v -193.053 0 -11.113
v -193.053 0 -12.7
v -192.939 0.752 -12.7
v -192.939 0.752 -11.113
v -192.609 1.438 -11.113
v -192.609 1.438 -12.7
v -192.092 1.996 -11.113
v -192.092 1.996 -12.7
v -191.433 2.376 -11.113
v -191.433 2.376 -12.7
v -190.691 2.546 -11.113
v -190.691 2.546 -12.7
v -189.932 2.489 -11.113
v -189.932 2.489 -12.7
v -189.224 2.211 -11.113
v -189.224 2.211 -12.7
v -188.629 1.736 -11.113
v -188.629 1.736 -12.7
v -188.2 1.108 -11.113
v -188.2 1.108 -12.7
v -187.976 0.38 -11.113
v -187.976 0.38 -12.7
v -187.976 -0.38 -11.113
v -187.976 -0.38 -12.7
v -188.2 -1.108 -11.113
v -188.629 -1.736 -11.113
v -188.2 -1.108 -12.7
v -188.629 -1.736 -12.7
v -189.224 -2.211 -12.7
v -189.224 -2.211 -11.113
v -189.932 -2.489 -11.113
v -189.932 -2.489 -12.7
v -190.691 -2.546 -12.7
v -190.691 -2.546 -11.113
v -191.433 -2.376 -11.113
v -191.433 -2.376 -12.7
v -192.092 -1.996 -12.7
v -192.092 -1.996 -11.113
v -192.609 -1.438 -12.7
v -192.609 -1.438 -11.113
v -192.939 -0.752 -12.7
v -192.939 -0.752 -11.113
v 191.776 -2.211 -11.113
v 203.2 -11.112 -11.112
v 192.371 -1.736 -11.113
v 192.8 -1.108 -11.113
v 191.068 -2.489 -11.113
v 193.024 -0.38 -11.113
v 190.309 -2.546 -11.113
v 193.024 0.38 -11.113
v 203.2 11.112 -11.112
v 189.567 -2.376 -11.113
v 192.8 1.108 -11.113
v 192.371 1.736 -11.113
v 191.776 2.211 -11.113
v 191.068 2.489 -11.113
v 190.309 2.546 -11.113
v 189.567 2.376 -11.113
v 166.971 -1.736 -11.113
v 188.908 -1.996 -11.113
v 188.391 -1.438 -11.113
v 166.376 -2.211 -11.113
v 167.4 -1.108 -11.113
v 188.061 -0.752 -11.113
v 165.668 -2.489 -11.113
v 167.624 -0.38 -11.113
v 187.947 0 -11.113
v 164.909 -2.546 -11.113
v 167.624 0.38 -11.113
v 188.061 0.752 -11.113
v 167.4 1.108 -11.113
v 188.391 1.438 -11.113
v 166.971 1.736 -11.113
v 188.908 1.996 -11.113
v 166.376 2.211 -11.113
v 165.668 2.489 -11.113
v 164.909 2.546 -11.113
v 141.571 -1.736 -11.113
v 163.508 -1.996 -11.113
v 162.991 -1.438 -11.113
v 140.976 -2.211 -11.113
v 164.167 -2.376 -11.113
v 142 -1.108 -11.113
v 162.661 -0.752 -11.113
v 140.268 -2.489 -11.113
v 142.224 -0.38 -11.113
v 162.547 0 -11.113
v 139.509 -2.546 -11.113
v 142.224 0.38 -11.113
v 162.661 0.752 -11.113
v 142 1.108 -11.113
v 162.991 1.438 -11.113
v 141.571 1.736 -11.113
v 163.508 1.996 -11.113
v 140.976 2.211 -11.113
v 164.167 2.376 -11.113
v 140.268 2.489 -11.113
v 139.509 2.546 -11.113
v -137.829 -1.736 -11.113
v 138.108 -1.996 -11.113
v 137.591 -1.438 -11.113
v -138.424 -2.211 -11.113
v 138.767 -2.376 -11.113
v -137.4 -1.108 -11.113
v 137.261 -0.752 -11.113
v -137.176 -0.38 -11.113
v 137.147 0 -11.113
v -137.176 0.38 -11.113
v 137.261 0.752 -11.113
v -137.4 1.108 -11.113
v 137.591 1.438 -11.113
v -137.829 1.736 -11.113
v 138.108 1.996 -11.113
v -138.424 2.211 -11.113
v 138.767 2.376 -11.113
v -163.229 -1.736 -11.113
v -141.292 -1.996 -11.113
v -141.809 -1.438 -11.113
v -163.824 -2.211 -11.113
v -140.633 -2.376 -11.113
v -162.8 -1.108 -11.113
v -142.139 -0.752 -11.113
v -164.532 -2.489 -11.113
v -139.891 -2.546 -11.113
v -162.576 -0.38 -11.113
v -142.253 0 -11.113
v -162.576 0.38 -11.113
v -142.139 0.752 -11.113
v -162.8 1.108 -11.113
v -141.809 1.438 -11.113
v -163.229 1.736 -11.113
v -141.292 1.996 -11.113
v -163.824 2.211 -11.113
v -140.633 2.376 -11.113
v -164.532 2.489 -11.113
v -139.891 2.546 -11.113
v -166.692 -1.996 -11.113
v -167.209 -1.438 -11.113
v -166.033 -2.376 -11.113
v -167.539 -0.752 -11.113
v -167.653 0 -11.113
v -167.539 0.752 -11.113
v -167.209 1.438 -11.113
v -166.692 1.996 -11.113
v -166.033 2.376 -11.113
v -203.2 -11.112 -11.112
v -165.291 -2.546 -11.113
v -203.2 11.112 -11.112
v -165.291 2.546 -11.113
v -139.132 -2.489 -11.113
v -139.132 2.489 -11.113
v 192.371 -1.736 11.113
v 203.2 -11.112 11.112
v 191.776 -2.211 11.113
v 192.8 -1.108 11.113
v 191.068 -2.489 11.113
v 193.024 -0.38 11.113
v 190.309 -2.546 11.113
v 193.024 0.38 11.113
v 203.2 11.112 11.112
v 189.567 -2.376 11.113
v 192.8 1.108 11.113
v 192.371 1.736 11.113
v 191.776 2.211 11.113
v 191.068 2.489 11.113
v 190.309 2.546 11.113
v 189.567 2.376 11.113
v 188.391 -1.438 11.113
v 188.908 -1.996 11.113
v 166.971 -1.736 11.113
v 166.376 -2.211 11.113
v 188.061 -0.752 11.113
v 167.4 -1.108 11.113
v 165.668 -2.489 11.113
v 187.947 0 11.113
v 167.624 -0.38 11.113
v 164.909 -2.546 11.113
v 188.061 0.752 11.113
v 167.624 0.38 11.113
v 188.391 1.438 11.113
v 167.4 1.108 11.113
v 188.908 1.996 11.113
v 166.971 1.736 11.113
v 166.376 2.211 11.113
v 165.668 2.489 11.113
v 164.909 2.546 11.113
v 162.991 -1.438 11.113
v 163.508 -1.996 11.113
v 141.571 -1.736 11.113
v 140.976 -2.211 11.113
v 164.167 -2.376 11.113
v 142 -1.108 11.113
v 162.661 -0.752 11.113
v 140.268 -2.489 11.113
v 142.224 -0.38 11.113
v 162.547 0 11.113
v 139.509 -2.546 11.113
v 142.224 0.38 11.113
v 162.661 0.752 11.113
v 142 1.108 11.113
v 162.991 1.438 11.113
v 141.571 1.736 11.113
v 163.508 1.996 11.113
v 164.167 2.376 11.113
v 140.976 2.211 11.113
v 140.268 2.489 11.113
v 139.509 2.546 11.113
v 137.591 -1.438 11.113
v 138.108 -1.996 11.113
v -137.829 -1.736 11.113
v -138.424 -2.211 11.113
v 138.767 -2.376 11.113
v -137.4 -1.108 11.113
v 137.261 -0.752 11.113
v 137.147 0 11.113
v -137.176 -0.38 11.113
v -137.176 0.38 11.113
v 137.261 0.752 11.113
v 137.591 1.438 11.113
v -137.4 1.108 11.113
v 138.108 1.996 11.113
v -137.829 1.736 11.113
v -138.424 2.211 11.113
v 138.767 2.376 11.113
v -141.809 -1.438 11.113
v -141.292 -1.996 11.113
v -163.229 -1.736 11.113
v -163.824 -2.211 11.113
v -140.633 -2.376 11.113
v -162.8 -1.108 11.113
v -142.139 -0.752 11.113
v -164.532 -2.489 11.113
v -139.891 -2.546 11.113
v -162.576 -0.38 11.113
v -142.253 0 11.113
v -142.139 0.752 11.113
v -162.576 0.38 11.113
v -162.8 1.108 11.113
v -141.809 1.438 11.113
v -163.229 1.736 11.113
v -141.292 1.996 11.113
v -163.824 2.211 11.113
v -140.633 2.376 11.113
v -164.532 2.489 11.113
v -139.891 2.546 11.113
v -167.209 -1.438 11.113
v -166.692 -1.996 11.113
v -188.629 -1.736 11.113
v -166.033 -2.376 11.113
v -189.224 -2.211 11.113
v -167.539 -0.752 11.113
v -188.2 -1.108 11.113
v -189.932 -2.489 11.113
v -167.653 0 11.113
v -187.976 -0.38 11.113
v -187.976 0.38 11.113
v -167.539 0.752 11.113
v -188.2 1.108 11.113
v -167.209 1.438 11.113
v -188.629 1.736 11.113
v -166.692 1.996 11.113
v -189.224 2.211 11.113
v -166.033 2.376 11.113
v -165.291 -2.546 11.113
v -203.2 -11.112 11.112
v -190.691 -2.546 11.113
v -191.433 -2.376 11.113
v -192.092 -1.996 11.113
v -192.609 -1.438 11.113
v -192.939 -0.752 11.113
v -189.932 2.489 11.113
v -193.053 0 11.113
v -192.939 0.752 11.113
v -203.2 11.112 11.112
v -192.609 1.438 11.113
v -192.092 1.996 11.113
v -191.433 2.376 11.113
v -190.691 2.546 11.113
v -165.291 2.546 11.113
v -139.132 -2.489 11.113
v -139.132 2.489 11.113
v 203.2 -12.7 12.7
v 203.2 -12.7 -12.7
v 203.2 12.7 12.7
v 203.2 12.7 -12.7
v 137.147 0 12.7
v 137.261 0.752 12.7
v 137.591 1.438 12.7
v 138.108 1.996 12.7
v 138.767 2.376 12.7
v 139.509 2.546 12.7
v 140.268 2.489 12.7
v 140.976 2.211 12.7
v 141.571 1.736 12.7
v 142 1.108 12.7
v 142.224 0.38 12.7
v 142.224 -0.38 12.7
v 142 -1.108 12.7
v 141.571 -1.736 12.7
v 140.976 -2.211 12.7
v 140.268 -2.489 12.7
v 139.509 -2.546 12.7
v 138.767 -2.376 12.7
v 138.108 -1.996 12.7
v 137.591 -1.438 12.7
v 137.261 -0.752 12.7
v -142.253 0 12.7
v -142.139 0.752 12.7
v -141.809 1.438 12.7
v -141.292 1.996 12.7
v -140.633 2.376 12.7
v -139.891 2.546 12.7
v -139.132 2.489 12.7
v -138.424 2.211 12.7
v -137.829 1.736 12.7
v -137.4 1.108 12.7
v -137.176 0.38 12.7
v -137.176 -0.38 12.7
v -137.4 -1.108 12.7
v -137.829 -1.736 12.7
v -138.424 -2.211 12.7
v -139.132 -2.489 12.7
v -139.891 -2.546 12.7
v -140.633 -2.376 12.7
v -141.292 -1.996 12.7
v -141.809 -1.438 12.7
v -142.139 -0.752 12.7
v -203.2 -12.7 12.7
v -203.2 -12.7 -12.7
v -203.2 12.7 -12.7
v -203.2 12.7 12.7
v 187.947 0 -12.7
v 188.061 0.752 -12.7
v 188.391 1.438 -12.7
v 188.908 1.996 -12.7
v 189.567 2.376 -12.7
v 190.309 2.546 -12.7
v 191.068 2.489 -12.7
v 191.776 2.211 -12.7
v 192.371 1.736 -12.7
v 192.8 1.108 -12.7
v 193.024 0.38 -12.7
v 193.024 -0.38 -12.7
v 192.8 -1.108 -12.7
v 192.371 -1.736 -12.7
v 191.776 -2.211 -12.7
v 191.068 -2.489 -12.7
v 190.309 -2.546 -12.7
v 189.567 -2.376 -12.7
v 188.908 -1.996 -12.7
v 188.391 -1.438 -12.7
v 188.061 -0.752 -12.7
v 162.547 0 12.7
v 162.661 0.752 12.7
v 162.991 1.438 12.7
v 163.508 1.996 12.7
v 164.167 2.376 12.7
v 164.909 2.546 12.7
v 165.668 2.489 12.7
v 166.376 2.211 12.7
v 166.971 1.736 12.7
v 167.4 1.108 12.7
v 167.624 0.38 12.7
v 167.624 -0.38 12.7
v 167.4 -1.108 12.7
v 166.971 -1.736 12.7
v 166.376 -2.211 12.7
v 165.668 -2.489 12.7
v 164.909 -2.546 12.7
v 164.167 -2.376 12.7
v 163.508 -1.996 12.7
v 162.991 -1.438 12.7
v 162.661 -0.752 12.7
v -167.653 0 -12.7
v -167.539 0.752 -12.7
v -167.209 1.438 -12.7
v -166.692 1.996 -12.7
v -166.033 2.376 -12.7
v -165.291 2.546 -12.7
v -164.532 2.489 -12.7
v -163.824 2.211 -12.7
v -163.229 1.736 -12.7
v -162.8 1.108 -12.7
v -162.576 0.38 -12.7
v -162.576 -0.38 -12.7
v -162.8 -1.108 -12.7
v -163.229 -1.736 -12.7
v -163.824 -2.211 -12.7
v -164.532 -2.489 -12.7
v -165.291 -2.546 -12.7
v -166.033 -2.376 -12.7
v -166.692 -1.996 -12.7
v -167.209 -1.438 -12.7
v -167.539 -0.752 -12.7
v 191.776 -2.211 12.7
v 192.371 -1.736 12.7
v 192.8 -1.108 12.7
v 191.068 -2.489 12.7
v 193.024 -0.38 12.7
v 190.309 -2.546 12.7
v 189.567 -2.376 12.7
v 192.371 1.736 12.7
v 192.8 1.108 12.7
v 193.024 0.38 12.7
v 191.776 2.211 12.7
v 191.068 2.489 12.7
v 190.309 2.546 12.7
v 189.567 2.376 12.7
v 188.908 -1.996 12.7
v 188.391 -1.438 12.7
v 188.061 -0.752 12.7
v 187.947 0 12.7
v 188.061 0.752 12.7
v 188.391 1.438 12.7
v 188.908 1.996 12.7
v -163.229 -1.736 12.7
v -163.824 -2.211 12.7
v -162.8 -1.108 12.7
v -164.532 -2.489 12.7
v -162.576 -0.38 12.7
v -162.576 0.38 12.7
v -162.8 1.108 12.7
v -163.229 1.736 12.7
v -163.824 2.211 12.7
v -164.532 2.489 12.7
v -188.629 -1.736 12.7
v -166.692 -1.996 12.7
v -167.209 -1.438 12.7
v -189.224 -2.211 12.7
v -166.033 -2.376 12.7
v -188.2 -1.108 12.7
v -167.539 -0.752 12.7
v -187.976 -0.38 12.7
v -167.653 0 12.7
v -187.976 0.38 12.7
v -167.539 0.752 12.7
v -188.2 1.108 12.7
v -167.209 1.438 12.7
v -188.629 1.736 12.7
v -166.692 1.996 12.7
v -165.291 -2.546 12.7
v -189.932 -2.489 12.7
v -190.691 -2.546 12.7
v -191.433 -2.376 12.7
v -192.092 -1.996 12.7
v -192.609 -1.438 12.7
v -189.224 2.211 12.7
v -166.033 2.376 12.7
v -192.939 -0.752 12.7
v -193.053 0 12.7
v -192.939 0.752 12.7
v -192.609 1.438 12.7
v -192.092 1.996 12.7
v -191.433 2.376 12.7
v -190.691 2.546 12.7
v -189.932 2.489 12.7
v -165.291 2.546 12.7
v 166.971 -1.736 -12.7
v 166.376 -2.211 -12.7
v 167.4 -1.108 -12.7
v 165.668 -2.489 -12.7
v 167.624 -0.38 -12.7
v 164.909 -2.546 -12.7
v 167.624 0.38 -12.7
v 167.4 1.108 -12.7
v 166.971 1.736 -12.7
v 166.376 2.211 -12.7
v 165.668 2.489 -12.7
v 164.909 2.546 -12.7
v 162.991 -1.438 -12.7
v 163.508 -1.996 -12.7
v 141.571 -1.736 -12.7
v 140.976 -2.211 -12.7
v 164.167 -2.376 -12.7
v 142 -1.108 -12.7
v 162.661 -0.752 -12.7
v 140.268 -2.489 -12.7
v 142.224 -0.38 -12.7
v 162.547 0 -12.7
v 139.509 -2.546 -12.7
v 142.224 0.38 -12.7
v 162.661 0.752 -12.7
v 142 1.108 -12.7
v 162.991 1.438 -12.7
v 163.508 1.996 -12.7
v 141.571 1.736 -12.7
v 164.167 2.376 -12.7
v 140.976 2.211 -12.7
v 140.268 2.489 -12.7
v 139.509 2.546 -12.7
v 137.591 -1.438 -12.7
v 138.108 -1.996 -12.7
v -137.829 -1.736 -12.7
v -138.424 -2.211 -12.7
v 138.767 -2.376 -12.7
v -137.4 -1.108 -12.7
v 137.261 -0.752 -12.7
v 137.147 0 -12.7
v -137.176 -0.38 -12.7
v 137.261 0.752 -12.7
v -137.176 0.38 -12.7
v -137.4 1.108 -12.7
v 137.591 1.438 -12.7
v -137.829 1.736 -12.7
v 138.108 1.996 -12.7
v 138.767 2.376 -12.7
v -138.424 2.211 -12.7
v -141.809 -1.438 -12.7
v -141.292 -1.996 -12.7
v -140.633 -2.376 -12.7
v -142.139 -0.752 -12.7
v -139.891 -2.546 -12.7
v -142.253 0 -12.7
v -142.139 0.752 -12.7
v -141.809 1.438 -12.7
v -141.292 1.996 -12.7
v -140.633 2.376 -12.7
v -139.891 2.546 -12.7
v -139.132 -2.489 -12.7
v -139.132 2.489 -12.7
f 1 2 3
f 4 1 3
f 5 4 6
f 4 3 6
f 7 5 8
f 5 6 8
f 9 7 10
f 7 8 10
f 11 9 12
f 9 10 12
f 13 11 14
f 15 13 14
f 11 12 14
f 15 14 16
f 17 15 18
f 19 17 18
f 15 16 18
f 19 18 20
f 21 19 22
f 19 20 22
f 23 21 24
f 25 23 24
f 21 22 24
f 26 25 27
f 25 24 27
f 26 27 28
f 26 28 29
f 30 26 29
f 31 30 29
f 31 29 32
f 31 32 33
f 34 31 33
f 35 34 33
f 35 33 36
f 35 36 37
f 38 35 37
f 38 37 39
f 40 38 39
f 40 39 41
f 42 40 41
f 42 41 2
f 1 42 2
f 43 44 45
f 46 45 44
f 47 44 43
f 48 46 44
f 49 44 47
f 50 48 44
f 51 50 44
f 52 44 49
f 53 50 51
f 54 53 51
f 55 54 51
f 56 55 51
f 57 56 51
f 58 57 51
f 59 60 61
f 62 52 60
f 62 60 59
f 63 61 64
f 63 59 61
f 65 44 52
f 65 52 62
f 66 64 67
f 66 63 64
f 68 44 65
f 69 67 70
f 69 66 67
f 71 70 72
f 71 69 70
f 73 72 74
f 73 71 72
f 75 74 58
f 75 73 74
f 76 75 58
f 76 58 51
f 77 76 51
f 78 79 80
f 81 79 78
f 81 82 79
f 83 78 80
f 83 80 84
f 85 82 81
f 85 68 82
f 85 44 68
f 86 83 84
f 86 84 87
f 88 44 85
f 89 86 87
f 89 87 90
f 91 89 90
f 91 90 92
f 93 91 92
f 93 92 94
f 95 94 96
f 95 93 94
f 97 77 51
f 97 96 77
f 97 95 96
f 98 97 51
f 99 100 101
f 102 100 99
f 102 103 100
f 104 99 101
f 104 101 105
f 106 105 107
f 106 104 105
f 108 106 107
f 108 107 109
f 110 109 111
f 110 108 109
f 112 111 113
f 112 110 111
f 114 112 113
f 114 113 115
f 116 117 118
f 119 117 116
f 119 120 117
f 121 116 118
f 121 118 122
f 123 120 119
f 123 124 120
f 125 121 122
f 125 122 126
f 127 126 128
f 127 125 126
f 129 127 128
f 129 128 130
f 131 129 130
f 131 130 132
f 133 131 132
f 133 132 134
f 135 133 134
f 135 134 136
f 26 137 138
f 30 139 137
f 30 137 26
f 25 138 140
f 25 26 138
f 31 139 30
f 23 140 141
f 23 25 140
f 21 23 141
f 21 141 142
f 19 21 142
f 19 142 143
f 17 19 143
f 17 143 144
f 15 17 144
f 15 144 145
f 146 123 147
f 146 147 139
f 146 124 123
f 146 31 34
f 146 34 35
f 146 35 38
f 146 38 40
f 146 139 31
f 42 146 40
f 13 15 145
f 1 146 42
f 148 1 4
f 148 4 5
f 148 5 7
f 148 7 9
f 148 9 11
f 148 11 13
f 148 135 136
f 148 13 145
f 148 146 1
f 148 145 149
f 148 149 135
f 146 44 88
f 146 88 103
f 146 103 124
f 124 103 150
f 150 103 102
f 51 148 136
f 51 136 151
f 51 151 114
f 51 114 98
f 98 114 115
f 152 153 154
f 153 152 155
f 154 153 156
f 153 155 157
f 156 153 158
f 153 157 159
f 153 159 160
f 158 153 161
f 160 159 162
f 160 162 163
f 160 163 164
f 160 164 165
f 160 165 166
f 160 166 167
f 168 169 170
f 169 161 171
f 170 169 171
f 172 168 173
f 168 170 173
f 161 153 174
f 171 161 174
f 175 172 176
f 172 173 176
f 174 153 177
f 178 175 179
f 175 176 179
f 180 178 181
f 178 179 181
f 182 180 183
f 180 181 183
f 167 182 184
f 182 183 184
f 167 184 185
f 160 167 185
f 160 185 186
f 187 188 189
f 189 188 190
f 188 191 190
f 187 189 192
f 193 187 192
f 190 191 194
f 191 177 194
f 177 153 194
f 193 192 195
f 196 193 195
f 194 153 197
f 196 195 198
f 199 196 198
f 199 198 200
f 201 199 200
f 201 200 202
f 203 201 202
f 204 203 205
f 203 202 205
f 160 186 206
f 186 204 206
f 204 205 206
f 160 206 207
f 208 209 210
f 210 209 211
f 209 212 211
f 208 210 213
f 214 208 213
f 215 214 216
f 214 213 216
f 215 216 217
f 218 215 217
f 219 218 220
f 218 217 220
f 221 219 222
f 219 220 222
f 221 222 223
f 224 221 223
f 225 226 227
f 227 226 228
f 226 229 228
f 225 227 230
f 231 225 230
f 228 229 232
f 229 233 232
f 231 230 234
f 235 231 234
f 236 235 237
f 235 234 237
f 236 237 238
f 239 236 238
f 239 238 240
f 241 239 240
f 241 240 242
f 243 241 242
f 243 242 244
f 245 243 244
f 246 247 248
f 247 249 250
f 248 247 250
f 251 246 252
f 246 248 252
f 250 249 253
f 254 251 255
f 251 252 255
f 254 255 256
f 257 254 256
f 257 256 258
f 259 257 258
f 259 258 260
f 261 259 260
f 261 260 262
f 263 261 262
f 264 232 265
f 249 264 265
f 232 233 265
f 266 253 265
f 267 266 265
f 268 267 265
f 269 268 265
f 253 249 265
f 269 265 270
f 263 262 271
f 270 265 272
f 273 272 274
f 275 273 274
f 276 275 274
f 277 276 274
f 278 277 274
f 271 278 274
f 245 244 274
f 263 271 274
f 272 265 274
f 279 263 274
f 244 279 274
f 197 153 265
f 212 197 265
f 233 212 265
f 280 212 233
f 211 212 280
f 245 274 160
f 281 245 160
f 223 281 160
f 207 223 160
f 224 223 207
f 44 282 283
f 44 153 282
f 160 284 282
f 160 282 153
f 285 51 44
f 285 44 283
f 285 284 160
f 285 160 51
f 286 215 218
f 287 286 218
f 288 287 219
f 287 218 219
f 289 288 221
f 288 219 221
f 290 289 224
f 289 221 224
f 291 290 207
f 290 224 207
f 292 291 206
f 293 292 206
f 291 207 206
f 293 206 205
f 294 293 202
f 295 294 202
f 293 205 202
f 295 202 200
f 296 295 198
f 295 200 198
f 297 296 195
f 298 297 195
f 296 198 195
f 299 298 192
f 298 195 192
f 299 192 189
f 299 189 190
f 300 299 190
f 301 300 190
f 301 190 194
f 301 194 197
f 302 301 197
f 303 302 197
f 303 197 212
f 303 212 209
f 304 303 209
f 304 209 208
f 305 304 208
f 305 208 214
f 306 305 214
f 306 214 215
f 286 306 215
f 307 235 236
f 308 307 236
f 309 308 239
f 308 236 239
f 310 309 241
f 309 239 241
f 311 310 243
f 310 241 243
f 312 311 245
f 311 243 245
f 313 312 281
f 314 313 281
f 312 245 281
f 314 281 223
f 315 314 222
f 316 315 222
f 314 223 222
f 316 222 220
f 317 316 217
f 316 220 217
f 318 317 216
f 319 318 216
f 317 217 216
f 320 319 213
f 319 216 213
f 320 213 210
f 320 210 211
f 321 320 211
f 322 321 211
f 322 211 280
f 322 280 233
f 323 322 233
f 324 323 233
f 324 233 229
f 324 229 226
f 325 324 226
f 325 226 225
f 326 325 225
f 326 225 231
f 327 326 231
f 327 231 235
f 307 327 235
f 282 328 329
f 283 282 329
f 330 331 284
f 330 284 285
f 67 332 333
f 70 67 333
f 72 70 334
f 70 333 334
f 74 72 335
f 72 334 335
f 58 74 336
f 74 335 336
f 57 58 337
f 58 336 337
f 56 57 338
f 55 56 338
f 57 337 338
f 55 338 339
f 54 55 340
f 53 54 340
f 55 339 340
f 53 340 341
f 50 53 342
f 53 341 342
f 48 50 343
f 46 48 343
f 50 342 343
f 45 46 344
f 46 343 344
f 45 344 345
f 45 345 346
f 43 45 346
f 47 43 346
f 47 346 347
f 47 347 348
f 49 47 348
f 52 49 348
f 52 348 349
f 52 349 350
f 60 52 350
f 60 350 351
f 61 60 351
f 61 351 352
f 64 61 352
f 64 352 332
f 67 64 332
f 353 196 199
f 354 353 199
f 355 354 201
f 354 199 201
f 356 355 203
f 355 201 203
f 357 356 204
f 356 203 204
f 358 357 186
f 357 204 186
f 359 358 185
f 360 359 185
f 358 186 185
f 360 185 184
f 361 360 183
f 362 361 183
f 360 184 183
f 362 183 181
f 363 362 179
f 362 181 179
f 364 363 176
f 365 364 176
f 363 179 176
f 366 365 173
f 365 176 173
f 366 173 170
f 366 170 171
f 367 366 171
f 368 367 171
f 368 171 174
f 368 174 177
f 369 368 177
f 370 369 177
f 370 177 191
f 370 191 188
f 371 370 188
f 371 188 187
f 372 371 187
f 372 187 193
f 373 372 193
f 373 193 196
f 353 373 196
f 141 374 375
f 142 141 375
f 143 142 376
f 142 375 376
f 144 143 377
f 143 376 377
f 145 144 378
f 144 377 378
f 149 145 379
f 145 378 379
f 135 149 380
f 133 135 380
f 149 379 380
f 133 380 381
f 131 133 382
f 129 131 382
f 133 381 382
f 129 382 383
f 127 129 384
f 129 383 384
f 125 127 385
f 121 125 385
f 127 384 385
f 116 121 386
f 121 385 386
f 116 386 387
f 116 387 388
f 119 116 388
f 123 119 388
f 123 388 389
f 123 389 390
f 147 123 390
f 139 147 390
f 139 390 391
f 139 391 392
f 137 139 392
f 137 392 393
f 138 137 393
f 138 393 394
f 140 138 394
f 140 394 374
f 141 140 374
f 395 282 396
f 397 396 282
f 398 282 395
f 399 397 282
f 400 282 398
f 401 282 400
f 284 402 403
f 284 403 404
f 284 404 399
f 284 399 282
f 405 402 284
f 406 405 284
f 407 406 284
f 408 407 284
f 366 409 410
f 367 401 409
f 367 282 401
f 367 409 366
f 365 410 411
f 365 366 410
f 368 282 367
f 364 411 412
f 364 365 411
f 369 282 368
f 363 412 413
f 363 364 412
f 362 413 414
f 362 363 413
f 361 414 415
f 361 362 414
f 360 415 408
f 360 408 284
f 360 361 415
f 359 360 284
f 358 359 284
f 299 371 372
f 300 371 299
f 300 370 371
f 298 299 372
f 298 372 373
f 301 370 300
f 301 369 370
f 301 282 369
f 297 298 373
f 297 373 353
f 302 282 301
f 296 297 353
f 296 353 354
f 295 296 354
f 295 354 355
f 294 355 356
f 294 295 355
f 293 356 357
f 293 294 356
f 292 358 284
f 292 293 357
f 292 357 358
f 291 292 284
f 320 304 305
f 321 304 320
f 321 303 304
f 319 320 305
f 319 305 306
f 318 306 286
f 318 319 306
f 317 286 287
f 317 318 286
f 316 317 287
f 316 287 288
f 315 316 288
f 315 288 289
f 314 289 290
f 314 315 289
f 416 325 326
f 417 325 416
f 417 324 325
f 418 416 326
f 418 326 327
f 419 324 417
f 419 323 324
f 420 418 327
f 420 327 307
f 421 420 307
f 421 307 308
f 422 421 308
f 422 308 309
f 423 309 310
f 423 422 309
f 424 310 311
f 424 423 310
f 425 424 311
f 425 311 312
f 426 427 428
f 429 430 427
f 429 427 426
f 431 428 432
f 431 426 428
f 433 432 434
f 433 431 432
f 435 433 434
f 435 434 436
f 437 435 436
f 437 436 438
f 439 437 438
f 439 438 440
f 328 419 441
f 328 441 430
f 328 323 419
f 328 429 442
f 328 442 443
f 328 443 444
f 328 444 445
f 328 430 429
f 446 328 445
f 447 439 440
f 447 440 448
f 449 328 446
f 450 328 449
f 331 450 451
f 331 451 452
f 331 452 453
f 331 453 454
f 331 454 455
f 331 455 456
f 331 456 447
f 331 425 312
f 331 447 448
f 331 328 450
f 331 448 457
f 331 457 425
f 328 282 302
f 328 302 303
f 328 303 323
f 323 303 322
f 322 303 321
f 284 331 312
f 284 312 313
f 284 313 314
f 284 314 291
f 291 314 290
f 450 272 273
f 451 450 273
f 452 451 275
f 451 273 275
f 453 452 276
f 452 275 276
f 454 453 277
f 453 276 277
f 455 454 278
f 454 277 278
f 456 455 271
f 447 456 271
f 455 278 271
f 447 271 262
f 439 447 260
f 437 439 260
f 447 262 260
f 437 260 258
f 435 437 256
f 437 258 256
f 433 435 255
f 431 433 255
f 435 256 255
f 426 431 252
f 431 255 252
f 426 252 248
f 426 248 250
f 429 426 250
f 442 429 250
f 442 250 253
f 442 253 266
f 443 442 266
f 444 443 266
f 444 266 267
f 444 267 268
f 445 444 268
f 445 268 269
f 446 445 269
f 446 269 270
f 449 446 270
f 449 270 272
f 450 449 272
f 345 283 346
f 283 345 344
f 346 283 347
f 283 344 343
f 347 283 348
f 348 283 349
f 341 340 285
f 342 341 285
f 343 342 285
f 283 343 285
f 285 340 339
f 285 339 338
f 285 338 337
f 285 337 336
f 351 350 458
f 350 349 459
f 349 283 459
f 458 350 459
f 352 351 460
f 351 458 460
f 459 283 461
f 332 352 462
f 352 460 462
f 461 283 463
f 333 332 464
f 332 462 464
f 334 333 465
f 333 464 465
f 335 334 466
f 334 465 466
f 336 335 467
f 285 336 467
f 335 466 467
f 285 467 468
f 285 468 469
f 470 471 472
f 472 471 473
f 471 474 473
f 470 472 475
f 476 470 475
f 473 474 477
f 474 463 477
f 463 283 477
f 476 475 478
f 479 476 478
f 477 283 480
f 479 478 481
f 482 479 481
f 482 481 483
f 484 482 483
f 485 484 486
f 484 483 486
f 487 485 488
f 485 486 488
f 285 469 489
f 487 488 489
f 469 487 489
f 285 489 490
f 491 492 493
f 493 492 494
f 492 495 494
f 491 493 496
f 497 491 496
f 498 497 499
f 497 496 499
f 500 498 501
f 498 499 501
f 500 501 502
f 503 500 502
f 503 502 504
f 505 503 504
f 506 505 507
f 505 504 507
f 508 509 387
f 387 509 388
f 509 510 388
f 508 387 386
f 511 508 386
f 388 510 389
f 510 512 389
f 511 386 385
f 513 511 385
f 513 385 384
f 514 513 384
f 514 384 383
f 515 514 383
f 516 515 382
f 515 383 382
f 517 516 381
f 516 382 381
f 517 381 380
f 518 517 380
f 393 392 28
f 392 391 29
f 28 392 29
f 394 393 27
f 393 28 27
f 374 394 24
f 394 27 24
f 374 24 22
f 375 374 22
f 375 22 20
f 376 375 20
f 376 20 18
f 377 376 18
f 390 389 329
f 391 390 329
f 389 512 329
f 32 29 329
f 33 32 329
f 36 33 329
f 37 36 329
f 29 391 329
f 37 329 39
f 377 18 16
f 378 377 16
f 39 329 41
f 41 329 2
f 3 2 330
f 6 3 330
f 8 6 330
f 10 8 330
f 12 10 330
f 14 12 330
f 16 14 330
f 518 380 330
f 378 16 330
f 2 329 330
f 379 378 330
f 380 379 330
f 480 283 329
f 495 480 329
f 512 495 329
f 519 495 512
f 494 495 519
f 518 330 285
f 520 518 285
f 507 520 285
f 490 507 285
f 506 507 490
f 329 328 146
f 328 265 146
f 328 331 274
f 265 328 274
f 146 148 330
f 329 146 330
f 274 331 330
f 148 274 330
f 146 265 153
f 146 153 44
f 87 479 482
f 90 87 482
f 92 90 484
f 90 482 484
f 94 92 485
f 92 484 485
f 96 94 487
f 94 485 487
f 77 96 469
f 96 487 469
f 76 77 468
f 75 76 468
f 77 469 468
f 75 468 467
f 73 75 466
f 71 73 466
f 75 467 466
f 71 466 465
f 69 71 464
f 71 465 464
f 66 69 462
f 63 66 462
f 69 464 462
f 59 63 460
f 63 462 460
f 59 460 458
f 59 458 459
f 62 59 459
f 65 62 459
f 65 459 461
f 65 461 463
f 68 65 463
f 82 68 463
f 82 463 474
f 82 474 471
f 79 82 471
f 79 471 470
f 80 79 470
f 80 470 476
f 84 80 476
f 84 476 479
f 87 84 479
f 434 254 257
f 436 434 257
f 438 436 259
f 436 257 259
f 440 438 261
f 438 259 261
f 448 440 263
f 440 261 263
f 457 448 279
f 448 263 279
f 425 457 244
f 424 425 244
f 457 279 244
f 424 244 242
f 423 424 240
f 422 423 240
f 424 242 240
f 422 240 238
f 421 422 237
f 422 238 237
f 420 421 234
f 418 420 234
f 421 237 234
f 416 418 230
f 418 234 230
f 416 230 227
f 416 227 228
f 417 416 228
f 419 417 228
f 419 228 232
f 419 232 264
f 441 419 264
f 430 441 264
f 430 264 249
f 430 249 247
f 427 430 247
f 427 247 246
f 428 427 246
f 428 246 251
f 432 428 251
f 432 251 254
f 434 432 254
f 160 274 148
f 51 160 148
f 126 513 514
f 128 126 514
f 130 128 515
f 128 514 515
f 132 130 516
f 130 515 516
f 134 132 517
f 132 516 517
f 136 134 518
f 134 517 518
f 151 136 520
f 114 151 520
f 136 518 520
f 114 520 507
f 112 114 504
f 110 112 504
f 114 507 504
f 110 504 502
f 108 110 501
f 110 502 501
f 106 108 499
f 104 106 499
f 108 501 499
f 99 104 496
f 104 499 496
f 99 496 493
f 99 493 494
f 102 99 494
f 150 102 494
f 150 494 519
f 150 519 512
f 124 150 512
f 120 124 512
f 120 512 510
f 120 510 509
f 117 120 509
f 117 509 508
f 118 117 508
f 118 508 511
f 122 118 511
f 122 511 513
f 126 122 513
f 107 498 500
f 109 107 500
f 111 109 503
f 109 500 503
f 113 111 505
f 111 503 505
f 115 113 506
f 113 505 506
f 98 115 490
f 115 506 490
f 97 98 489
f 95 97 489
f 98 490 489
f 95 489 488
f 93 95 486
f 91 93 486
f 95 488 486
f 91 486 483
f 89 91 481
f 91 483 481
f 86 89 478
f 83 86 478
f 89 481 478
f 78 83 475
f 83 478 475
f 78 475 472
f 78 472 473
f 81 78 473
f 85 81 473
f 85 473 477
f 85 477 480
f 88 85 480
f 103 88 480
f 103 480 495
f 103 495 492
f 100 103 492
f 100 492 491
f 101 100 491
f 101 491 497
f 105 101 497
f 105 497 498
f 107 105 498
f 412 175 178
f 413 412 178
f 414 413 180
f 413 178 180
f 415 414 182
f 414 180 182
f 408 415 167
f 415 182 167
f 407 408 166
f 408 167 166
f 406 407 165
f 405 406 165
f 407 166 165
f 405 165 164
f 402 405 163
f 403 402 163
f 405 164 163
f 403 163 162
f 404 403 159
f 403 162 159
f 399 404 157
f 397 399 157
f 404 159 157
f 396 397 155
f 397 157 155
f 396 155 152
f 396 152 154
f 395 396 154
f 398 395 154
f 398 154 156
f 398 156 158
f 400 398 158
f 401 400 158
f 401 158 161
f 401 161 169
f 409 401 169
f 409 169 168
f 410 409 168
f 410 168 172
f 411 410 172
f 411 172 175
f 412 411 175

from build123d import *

# Parameters (mm, degrees)
BOSS_EXTRUDE1_DEPTH        = 203.2
BOSS_EXTRUDE1_DEPTH_BACK   = 203.2
SKETCH1_W                  = 25.4
SKETCH1_H                  = 25.4
SKETCH1_W_2                = 22.225
SKETCH1_H_2                = 22.225
F_7_0_201_DIAMETER_HOLE2_D = 5.1054


with BuildPart() as part:
    # Sketch1 → Boss-Extrude1 (new, two sides: drawn at the far end of the back side and taken through both)
    with BuildSketch(Plane(origin=(0, 0, 0), x_dir=(0, 0, -1), z_dir=(1, 0, 0)).offset(-BOSS_EXTRUDE1_DEPTH_BACK)):
        Rectangle(SKETCH1_W, SKETCH1_H)
        Rectangle(SKETCH1_W_2, SKETCH1_H_2, mode=Mode.SUBTRACT)
    extrude(amount=BOSS_EXTRUDE1_DEPTH + BOSS_EXTRUDE1_DEPTH_BACK)

    # #7 (0.201) Diameter Hole2 (through all)
    with Locations(Plane.XY.offset(12.7)):
        with Locations((190.5, 0), (165.1, 0), (139.7, 0), (-139.7, 0), (-165.1, 0), (-190.5, 0)):
            Hole(F_7_0_201_DIAMETER_HOLE2_D / 2)


solid = part.part
